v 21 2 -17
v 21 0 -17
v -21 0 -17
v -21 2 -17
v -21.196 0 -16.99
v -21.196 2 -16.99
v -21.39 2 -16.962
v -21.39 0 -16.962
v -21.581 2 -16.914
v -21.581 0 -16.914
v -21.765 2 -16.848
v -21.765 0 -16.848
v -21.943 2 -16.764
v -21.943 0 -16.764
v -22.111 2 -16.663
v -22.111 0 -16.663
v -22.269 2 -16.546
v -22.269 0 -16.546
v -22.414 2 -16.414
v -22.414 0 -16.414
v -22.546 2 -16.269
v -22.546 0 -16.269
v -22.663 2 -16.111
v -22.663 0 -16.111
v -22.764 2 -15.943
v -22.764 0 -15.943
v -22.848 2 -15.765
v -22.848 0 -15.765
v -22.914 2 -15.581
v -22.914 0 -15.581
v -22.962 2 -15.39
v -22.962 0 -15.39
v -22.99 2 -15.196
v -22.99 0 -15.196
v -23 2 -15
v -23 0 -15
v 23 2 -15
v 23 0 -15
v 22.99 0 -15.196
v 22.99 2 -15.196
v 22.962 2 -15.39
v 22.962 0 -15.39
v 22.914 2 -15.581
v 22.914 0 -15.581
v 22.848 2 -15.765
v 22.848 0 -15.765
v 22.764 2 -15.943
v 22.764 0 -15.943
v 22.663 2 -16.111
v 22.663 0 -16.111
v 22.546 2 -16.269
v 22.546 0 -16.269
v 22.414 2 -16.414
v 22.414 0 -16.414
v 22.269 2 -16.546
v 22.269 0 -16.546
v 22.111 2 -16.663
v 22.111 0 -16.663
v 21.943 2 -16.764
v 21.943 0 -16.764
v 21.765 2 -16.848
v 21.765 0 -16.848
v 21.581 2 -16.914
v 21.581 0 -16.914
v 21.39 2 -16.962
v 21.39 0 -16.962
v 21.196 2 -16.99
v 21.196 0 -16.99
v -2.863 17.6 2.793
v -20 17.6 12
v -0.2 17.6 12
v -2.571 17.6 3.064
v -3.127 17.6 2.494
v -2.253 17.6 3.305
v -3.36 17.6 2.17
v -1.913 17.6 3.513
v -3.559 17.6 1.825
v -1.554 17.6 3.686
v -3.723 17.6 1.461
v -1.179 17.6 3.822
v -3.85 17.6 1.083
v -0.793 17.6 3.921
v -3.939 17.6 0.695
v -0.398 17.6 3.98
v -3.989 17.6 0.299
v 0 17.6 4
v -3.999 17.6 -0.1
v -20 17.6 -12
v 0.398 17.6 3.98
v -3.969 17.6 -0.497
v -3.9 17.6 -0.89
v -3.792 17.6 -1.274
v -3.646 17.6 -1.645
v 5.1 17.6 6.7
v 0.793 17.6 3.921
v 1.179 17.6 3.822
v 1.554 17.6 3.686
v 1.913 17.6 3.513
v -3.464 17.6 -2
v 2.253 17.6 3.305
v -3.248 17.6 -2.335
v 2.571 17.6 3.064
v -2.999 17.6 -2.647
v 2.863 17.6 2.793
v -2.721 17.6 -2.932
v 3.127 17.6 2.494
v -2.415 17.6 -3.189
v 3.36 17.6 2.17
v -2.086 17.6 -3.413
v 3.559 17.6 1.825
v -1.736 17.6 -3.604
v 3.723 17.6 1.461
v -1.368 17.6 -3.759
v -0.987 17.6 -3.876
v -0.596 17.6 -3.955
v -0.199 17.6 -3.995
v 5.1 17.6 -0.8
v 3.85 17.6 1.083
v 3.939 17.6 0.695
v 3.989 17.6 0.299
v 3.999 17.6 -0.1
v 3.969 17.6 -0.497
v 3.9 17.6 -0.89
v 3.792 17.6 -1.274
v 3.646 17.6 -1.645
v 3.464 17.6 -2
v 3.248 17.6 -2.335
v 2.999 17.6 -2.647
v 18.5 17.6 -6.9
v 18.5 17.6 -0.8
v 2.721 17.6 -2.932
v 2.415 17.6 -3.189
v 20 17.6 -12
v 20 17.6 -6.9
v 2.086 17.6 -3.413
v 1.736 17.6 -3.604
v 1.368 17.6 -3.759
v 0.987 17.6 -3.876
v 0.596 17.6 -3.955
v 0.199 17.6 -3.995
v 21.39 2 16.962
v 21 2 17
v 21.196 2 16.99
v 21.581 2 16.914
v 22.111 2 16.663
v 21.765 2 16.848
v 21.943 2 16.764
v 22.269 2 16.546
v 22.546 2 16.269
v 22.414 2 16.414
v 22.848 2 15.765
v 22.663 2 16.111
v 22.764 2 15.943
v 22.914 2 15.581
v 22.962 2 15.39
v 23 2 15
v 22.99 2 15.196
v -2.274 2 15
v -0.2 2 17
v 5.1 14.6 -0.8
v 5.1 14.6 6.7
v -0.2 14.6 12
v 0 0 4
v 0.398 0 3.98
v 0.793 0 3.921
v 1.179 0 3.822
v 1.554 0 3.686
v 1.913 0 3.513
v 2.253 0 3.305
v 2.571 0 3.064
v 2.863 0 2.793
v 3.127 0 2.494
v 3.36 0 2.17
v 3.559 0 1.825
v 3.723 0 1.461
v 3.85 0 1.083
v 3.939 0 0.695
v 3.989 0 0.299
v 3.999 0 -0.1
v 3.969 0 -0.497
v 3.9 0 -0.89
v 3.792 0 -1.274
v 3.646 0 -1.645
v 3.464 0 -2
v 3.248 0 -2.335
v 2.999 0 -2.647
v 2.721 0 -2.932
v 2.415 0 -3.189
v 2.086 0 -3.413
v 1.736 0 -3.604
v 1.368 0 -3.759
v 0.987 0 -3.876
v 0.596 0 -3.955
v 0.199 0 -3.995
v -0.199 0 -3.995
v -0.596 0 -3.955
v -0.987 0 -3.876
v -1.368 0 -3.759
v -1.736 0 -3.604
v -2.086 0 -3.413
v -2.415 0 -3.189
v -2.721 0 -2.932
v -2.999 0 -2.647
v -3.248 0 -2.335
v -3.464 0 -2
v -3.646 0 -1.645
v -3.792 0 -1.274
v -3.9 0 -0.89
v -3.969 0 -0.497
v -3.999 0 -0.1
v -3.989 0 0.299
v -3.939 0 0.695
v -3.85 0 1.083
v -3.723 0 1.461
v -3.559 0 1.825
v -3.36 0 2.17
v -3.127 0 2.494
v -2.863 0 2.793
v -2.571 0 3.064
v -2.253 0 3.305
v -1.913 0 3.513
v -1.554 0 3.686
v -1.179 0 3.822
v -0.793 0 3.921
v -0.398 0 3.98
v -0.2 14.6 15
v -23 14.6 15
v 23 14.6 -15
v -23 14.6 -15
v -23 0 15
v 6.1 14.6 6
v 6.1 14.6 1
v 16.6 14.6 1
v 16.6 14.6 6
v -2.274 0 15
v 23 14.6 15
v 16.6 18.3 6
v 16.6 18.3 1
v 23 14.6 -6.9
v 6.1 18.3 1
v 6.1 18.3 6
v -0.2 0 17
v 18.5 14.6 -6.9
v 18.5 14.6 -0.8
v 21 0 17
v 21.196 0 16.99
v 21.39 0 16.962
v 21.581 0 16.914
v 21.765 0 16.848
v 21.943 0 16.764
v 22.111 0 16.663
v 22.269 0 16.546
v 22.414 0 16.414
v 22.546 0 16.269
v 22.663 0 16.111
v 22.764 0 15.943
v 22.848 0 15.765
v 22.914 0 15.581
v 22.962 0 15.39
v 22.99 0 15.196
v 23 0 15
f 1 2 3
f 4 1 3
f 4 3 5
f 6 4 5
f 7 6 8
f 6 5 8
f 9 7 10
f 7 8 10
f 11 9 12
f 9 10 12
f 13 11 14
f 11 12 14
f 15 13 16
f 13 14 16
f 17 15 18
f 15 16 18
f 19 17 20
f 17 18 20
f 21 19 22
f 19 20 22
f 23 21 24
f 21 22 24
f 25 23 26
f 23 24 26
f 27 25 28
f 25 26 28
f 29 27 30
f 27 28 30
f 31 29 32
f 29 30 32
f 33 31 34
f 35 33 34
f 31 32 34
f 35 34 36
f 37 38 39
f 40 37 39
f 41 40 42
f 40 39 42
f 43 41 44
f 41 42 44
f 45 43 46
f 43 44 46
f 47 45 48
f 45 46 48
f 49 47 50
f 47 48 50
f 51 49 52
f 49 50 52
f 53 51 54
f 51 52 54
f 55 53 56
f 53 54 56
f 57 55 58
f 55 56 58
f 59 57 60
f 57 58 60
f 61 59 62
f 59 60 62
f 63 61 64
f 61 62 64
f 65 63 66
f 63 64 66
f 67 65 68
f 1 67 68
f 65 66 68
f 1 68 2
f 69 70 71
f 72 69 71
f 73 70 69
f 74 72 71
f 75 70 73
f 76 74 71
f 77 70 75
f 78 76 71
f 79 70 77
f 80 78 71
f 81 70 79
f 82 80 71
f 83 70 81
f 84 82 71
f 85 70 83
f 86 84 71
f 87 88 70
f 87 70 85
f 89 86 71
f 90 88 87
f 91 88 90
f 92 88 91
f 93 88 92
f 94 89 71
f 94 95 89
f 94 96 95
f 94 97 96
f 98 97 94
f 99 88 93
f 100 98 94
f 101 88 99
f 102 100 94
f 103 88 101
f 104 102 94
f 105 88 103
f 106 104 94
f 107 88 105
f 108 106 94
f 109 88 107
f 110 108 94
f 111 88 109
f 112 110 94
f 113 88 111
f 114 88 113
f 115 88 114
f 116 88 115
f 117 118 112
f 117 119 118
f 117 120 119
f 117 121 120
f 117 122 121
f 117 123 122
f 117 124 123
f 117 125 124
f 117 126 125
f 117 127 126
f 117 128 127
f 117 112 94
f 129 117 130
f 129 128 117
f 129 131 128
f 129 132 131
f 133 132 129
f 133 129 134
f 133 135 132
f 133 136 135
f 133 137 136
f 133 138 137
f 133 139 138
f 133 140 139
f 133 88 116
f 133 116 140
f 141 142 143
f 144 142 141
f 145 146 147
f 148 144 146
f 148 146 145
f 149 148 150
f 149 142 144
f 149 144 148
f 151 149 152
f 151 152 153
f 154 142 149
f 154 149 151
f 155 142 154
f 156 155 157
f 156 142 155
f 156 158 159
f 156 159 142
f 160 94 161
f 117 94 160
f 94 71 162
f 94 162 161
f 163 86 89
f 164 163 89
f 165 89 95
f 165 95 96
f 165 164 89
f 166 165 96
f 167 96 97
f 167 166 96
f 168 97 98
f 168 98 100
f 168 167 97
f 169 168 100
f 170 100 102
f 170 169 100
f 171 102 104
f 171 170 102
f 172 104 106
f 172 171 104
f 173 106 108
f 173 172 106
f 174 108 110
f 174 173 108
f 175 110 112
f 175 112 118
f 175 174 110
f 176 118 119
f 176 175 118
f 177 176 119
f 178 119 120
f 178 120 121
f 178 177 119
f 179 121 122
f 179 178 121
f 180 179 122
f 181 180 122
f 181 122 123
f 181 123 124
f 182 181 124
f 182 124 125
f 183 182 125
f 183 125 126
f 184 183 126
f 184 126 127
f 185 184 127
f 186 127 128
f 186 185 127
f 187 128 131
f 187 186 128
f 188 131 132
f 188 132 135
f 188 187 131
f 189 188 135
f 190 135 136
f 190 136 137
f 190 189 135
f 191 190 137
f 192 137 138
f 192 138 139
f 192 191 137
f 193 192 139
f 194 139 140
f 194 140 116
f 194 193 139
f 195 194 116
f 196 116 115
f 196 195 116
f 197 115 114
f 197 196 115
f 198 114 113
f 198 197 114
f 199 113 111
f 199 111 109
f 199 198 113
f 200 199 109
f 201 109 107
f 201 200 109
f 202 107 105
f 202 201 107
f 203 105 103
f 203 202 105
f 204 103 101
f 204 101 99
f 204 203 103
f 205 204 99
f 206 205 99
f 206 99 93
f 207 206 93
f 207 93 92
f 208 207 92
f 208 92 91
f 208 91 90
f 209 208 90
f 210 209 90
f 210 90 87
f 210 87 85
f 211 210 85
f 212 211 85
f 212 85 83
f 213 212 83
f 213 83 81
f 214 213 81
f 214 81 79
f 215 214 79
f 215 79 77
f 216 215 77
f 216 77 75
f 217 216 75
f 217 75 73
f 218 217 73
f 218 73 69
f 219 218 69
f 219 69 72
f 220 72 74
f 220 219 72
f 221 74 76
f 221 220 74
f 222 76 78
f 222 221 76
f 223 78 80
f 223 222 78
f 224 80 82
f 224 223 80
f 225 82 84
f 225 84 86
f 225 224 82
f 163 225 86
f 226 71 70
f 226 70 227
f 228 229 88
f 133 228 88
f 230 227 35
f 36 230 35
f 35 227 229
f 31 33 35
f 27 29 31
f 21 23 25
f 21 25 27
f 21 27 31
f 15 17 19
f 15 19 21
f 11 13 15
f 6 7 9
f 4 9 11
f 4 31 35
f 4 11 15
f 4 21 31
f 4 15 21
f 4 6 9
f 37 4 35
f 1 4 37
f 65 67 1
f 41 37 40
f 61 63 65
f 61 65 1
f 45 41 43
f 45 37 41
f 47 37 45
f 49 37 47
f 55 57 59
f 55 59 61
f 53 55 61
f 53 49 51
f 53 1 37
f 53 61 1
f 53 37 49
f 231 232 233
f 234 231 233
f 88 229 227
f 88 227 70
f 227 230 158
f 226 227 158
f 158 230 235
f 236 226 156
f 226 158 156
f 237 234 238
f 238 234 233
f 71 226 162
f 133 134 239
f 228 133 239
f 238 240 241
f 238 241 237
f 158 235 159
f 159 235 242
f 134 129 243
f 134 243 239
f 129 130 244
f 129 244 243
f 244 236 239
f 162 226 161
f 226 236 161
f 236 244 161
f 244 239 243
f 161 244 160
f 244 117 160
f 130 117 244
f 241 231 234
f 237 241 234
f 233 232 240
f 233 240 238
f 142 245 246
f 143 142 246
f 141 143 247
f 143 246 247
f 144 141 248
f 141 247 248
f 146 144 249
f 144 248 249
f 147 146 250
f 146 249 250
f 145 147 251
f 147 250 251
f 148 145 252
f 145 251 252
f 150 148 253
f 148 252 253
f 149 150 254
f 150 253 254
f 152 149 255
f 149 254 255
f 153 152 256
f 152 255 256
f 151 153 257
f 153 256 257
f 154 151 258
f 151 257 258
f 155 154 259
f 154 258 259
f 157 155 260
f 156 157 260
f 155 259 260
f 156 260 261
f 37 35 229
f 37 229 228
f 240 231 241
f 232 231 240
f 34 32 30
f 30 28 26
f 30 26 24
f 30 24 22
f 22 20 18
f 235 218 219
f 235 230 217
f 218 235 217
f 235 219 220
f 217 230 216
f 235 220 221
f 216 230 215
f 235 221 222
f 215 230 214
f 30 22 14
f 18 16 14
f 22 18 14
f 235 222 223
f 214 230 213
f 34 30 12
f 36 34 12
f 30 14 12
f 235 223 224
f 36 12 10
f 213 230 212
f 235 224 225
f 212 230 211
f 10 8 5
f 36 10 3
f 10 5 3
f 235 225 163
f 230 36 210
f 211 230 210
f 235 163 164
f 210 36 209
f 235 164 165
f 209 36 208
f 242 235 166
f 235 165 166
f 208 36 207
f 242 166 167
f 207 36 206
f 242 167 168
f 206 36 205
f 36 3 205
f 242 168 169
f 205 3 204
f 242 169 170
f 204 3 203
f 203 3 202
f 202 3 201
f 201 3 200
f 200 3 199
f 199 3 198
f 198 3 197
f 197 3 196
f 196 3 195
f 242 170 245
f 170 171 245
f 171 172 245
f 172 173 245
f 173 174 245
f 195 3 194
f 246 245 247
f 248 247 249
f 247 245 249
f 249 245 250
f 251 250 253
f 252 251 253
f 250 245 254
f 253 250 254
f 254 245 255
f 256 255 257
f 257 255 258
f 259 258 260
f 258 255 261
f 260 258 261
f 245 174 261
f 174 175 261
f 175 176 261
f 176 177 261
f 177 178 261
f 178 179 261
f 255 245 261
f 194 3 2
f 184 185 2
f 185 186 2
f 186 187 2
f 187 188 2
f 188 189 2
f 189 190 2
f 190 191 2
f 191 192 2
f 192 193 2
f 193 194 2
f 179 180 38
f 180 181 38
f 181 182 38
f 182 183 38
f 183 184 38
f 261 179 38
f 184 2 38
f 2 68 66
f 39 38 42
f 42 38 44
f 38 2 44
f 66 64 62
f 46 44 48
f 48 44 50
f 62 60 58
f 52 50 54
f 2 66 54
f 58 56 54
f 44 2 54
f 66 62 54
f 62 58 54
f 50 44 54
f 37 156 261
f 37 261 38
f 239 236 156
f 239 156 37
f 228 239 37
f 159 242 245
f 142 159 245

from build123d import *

# Parameters (mm, degrees)
SKETCH_13_R         = 4.5
EXTRUDE_8_DEPTH     = 2
SKETCH_14_W         = 46
SKETCH_14_H         = 30
SKETCH_14_R         = 4.5
EXTRUDE_9_DEPTH     = 14.6
SKETCH_15_W         = 40
SKETCH_15_H         = 24
SKETCH_15_R         = 4
EXTRUDE_10_DEPTH    = 17.6
EXTRUDE_START       = 12
EXTRUDE_11_DEPTH    = 24
EXTRUDE_START_2     = -23
EXTRUDE_12_DEPTH    = 46
EXTRUDE_START_3     = -16
EXTRUDE_12_2_DEPTH  = 32
CUT_EXTRUDE_START   = 17.6
CUT_EXTRUDE_2_DEPTH = 3
EXTRUDE_START_4     = 14.6
SKETCH_19_W         = 10.5
SKETCH_19_H         = 5
EXTRUDE_13_DEPTH    = 3.7


with BuildPart() as part:
    # 草图13 → 凸台-拉伸8 (new body)
    with BuildSketch(Plane(origin=(0, 0, 0), x_dir=(1, 0, 0), z_dir=(0, 1, 0))):
        with BuildLine():
            Line((-23, -14.3), (-3, -14.3))
            Line((-3, -14.3), (-0.2, -17))
            Line((-0.2, -17), (21, -17))
            ThreePointArc((21, -17), (22.414213562, -16.414213562), (23, -15))
            Line((23, -15), (23, 15))
            ThreePointArc((23, 15), (22.414213562, 16.414213562), (21, 17))
            Line((21, 17), (-21, 17))
            ThreePointArc((-21, 17), (-22.414213562, 16.414213562), (-23, 15))
            Line((-23, 15), (-23, -14.3))
        make_face()
        with Locations(Location((0, 0, 0), (0, 0, 270))):
            Circle(SKETCH_13_R, mode=Mode.SUBTRACT)
    extrude(amount=EXTRUDE_8_DEPTH)

    # 草图14 → 凸台-拉伸9 (add)
    with BuildSketch(Plane(origin=(0, 0, 0), x_dir=(1, 0, 0), z_dir=(0, 1, 0))):
        Rectangle(SKETCH_14_W, SKETCH_14_H)
        with Locations(Location((0, 0, 0), (0, 0, 270))):
            Circle(SKETCH_14_R, mode=Mode.SUBTRACT)
    extrude(amount=EXTRUDE_9_DEPTH)

    # 草图15 → 凸台-拉伸10 (add)
    with BuildSketch(Plane(origin=(0, 0, 0), x_dir=(1, 0, 0), z_dir=(0, 1, 0))):
        Rectangle(SKETCH_15_W, SKETCH_15_H)
        with Locations(Location((0, 0, 0), (0, 0, 270))):
            Circle(SKETCH_15_R, mode=Mode.SUBTRACT)
    extrude(amount=EXTRUDE_10_DEPTH)

    # 草图16 → 凸台-拉伸11 (add)
    with BuildSketch(Plane.XY.offset(EXTRUDE_START)):
        Polygon((-20, 14.6), (-20, 17.6), (-23, 14.6), align=None)
        Polygon((20, 17.6), (20, 14.6), (23, 14.6), align=None)
    extrude(amount=-EXTRUDE_11_DEPTH)

    # 凸台-拉伸12: read off the stored shape, not the designer's step
    # 凸台-拉伸12 outline → 凸台-拉伸12 (add)
    with BuildSketch(Plane(origin=(0, 0, 0), x_dir=(0, 0, -1), z_dir=(1, 0, 0)).offset(EXTRUDE_START_2)):
        Polygon((15, 14.6), (12, 17.6), (12, 14.6), align=None)
        Polygon((-12, 17.6), (-15, 14.6), (-12, 14.6), align=None)
    extrude(amount=EXTRUDE_12_DEPTH)

    # Extrude 12 2 outline → Extrude 12 2 (cut)
    with BuildSketch(Plane.XY.offset(EXTRUDE_START_3)):
        Polygon((-23, 14.6), (-18.6, 19), (-23, 19), align=None)
        Polygon((23, 19), (18.6, 19), (23, 14.6), align=None)
    extrude(amount=EXTRUDE_12_2_DEPTH, mode=Mode.SUBTRACT)

    # 草图18 → 切除-拉伸2 (cut)
    with BuildSketch(Plane(origin=(0, 0, 0), x_dir=(1, 0, 0), z_dir=(0, 1, 0)).offset(CUT_EXTRUDE_START)):
        Polygon((-0.2, -15), (-0.2, -12), (5.1, -6.7), (5.1, 0.8), (18.5, 0.8), (18.5, 6.9), (23, 6.9), (23, -15), align=None)
    extrude(amount=-CUT_EXTRUDE_2_DEPTH, mode=Mode.SUBTRACT)


with BuildPart() as body_2:
    # 草图19 → 凸台-拉伸13 (new body)
    with BuildSketch(Plane(origin=(0, 0, 0), x_dir=(1, 0, 0), z_dir=(0, 1, 0)).offset(EXTRUDE_START_4)):
        with Locations((11.35, -3.5)):
            Rectangle(SKETCH_19_W, SKETCH_19_H)
    extrude(amount=EXTRUDE_13_DEPTH)


solid = Compound([part.part, body_2.part])
